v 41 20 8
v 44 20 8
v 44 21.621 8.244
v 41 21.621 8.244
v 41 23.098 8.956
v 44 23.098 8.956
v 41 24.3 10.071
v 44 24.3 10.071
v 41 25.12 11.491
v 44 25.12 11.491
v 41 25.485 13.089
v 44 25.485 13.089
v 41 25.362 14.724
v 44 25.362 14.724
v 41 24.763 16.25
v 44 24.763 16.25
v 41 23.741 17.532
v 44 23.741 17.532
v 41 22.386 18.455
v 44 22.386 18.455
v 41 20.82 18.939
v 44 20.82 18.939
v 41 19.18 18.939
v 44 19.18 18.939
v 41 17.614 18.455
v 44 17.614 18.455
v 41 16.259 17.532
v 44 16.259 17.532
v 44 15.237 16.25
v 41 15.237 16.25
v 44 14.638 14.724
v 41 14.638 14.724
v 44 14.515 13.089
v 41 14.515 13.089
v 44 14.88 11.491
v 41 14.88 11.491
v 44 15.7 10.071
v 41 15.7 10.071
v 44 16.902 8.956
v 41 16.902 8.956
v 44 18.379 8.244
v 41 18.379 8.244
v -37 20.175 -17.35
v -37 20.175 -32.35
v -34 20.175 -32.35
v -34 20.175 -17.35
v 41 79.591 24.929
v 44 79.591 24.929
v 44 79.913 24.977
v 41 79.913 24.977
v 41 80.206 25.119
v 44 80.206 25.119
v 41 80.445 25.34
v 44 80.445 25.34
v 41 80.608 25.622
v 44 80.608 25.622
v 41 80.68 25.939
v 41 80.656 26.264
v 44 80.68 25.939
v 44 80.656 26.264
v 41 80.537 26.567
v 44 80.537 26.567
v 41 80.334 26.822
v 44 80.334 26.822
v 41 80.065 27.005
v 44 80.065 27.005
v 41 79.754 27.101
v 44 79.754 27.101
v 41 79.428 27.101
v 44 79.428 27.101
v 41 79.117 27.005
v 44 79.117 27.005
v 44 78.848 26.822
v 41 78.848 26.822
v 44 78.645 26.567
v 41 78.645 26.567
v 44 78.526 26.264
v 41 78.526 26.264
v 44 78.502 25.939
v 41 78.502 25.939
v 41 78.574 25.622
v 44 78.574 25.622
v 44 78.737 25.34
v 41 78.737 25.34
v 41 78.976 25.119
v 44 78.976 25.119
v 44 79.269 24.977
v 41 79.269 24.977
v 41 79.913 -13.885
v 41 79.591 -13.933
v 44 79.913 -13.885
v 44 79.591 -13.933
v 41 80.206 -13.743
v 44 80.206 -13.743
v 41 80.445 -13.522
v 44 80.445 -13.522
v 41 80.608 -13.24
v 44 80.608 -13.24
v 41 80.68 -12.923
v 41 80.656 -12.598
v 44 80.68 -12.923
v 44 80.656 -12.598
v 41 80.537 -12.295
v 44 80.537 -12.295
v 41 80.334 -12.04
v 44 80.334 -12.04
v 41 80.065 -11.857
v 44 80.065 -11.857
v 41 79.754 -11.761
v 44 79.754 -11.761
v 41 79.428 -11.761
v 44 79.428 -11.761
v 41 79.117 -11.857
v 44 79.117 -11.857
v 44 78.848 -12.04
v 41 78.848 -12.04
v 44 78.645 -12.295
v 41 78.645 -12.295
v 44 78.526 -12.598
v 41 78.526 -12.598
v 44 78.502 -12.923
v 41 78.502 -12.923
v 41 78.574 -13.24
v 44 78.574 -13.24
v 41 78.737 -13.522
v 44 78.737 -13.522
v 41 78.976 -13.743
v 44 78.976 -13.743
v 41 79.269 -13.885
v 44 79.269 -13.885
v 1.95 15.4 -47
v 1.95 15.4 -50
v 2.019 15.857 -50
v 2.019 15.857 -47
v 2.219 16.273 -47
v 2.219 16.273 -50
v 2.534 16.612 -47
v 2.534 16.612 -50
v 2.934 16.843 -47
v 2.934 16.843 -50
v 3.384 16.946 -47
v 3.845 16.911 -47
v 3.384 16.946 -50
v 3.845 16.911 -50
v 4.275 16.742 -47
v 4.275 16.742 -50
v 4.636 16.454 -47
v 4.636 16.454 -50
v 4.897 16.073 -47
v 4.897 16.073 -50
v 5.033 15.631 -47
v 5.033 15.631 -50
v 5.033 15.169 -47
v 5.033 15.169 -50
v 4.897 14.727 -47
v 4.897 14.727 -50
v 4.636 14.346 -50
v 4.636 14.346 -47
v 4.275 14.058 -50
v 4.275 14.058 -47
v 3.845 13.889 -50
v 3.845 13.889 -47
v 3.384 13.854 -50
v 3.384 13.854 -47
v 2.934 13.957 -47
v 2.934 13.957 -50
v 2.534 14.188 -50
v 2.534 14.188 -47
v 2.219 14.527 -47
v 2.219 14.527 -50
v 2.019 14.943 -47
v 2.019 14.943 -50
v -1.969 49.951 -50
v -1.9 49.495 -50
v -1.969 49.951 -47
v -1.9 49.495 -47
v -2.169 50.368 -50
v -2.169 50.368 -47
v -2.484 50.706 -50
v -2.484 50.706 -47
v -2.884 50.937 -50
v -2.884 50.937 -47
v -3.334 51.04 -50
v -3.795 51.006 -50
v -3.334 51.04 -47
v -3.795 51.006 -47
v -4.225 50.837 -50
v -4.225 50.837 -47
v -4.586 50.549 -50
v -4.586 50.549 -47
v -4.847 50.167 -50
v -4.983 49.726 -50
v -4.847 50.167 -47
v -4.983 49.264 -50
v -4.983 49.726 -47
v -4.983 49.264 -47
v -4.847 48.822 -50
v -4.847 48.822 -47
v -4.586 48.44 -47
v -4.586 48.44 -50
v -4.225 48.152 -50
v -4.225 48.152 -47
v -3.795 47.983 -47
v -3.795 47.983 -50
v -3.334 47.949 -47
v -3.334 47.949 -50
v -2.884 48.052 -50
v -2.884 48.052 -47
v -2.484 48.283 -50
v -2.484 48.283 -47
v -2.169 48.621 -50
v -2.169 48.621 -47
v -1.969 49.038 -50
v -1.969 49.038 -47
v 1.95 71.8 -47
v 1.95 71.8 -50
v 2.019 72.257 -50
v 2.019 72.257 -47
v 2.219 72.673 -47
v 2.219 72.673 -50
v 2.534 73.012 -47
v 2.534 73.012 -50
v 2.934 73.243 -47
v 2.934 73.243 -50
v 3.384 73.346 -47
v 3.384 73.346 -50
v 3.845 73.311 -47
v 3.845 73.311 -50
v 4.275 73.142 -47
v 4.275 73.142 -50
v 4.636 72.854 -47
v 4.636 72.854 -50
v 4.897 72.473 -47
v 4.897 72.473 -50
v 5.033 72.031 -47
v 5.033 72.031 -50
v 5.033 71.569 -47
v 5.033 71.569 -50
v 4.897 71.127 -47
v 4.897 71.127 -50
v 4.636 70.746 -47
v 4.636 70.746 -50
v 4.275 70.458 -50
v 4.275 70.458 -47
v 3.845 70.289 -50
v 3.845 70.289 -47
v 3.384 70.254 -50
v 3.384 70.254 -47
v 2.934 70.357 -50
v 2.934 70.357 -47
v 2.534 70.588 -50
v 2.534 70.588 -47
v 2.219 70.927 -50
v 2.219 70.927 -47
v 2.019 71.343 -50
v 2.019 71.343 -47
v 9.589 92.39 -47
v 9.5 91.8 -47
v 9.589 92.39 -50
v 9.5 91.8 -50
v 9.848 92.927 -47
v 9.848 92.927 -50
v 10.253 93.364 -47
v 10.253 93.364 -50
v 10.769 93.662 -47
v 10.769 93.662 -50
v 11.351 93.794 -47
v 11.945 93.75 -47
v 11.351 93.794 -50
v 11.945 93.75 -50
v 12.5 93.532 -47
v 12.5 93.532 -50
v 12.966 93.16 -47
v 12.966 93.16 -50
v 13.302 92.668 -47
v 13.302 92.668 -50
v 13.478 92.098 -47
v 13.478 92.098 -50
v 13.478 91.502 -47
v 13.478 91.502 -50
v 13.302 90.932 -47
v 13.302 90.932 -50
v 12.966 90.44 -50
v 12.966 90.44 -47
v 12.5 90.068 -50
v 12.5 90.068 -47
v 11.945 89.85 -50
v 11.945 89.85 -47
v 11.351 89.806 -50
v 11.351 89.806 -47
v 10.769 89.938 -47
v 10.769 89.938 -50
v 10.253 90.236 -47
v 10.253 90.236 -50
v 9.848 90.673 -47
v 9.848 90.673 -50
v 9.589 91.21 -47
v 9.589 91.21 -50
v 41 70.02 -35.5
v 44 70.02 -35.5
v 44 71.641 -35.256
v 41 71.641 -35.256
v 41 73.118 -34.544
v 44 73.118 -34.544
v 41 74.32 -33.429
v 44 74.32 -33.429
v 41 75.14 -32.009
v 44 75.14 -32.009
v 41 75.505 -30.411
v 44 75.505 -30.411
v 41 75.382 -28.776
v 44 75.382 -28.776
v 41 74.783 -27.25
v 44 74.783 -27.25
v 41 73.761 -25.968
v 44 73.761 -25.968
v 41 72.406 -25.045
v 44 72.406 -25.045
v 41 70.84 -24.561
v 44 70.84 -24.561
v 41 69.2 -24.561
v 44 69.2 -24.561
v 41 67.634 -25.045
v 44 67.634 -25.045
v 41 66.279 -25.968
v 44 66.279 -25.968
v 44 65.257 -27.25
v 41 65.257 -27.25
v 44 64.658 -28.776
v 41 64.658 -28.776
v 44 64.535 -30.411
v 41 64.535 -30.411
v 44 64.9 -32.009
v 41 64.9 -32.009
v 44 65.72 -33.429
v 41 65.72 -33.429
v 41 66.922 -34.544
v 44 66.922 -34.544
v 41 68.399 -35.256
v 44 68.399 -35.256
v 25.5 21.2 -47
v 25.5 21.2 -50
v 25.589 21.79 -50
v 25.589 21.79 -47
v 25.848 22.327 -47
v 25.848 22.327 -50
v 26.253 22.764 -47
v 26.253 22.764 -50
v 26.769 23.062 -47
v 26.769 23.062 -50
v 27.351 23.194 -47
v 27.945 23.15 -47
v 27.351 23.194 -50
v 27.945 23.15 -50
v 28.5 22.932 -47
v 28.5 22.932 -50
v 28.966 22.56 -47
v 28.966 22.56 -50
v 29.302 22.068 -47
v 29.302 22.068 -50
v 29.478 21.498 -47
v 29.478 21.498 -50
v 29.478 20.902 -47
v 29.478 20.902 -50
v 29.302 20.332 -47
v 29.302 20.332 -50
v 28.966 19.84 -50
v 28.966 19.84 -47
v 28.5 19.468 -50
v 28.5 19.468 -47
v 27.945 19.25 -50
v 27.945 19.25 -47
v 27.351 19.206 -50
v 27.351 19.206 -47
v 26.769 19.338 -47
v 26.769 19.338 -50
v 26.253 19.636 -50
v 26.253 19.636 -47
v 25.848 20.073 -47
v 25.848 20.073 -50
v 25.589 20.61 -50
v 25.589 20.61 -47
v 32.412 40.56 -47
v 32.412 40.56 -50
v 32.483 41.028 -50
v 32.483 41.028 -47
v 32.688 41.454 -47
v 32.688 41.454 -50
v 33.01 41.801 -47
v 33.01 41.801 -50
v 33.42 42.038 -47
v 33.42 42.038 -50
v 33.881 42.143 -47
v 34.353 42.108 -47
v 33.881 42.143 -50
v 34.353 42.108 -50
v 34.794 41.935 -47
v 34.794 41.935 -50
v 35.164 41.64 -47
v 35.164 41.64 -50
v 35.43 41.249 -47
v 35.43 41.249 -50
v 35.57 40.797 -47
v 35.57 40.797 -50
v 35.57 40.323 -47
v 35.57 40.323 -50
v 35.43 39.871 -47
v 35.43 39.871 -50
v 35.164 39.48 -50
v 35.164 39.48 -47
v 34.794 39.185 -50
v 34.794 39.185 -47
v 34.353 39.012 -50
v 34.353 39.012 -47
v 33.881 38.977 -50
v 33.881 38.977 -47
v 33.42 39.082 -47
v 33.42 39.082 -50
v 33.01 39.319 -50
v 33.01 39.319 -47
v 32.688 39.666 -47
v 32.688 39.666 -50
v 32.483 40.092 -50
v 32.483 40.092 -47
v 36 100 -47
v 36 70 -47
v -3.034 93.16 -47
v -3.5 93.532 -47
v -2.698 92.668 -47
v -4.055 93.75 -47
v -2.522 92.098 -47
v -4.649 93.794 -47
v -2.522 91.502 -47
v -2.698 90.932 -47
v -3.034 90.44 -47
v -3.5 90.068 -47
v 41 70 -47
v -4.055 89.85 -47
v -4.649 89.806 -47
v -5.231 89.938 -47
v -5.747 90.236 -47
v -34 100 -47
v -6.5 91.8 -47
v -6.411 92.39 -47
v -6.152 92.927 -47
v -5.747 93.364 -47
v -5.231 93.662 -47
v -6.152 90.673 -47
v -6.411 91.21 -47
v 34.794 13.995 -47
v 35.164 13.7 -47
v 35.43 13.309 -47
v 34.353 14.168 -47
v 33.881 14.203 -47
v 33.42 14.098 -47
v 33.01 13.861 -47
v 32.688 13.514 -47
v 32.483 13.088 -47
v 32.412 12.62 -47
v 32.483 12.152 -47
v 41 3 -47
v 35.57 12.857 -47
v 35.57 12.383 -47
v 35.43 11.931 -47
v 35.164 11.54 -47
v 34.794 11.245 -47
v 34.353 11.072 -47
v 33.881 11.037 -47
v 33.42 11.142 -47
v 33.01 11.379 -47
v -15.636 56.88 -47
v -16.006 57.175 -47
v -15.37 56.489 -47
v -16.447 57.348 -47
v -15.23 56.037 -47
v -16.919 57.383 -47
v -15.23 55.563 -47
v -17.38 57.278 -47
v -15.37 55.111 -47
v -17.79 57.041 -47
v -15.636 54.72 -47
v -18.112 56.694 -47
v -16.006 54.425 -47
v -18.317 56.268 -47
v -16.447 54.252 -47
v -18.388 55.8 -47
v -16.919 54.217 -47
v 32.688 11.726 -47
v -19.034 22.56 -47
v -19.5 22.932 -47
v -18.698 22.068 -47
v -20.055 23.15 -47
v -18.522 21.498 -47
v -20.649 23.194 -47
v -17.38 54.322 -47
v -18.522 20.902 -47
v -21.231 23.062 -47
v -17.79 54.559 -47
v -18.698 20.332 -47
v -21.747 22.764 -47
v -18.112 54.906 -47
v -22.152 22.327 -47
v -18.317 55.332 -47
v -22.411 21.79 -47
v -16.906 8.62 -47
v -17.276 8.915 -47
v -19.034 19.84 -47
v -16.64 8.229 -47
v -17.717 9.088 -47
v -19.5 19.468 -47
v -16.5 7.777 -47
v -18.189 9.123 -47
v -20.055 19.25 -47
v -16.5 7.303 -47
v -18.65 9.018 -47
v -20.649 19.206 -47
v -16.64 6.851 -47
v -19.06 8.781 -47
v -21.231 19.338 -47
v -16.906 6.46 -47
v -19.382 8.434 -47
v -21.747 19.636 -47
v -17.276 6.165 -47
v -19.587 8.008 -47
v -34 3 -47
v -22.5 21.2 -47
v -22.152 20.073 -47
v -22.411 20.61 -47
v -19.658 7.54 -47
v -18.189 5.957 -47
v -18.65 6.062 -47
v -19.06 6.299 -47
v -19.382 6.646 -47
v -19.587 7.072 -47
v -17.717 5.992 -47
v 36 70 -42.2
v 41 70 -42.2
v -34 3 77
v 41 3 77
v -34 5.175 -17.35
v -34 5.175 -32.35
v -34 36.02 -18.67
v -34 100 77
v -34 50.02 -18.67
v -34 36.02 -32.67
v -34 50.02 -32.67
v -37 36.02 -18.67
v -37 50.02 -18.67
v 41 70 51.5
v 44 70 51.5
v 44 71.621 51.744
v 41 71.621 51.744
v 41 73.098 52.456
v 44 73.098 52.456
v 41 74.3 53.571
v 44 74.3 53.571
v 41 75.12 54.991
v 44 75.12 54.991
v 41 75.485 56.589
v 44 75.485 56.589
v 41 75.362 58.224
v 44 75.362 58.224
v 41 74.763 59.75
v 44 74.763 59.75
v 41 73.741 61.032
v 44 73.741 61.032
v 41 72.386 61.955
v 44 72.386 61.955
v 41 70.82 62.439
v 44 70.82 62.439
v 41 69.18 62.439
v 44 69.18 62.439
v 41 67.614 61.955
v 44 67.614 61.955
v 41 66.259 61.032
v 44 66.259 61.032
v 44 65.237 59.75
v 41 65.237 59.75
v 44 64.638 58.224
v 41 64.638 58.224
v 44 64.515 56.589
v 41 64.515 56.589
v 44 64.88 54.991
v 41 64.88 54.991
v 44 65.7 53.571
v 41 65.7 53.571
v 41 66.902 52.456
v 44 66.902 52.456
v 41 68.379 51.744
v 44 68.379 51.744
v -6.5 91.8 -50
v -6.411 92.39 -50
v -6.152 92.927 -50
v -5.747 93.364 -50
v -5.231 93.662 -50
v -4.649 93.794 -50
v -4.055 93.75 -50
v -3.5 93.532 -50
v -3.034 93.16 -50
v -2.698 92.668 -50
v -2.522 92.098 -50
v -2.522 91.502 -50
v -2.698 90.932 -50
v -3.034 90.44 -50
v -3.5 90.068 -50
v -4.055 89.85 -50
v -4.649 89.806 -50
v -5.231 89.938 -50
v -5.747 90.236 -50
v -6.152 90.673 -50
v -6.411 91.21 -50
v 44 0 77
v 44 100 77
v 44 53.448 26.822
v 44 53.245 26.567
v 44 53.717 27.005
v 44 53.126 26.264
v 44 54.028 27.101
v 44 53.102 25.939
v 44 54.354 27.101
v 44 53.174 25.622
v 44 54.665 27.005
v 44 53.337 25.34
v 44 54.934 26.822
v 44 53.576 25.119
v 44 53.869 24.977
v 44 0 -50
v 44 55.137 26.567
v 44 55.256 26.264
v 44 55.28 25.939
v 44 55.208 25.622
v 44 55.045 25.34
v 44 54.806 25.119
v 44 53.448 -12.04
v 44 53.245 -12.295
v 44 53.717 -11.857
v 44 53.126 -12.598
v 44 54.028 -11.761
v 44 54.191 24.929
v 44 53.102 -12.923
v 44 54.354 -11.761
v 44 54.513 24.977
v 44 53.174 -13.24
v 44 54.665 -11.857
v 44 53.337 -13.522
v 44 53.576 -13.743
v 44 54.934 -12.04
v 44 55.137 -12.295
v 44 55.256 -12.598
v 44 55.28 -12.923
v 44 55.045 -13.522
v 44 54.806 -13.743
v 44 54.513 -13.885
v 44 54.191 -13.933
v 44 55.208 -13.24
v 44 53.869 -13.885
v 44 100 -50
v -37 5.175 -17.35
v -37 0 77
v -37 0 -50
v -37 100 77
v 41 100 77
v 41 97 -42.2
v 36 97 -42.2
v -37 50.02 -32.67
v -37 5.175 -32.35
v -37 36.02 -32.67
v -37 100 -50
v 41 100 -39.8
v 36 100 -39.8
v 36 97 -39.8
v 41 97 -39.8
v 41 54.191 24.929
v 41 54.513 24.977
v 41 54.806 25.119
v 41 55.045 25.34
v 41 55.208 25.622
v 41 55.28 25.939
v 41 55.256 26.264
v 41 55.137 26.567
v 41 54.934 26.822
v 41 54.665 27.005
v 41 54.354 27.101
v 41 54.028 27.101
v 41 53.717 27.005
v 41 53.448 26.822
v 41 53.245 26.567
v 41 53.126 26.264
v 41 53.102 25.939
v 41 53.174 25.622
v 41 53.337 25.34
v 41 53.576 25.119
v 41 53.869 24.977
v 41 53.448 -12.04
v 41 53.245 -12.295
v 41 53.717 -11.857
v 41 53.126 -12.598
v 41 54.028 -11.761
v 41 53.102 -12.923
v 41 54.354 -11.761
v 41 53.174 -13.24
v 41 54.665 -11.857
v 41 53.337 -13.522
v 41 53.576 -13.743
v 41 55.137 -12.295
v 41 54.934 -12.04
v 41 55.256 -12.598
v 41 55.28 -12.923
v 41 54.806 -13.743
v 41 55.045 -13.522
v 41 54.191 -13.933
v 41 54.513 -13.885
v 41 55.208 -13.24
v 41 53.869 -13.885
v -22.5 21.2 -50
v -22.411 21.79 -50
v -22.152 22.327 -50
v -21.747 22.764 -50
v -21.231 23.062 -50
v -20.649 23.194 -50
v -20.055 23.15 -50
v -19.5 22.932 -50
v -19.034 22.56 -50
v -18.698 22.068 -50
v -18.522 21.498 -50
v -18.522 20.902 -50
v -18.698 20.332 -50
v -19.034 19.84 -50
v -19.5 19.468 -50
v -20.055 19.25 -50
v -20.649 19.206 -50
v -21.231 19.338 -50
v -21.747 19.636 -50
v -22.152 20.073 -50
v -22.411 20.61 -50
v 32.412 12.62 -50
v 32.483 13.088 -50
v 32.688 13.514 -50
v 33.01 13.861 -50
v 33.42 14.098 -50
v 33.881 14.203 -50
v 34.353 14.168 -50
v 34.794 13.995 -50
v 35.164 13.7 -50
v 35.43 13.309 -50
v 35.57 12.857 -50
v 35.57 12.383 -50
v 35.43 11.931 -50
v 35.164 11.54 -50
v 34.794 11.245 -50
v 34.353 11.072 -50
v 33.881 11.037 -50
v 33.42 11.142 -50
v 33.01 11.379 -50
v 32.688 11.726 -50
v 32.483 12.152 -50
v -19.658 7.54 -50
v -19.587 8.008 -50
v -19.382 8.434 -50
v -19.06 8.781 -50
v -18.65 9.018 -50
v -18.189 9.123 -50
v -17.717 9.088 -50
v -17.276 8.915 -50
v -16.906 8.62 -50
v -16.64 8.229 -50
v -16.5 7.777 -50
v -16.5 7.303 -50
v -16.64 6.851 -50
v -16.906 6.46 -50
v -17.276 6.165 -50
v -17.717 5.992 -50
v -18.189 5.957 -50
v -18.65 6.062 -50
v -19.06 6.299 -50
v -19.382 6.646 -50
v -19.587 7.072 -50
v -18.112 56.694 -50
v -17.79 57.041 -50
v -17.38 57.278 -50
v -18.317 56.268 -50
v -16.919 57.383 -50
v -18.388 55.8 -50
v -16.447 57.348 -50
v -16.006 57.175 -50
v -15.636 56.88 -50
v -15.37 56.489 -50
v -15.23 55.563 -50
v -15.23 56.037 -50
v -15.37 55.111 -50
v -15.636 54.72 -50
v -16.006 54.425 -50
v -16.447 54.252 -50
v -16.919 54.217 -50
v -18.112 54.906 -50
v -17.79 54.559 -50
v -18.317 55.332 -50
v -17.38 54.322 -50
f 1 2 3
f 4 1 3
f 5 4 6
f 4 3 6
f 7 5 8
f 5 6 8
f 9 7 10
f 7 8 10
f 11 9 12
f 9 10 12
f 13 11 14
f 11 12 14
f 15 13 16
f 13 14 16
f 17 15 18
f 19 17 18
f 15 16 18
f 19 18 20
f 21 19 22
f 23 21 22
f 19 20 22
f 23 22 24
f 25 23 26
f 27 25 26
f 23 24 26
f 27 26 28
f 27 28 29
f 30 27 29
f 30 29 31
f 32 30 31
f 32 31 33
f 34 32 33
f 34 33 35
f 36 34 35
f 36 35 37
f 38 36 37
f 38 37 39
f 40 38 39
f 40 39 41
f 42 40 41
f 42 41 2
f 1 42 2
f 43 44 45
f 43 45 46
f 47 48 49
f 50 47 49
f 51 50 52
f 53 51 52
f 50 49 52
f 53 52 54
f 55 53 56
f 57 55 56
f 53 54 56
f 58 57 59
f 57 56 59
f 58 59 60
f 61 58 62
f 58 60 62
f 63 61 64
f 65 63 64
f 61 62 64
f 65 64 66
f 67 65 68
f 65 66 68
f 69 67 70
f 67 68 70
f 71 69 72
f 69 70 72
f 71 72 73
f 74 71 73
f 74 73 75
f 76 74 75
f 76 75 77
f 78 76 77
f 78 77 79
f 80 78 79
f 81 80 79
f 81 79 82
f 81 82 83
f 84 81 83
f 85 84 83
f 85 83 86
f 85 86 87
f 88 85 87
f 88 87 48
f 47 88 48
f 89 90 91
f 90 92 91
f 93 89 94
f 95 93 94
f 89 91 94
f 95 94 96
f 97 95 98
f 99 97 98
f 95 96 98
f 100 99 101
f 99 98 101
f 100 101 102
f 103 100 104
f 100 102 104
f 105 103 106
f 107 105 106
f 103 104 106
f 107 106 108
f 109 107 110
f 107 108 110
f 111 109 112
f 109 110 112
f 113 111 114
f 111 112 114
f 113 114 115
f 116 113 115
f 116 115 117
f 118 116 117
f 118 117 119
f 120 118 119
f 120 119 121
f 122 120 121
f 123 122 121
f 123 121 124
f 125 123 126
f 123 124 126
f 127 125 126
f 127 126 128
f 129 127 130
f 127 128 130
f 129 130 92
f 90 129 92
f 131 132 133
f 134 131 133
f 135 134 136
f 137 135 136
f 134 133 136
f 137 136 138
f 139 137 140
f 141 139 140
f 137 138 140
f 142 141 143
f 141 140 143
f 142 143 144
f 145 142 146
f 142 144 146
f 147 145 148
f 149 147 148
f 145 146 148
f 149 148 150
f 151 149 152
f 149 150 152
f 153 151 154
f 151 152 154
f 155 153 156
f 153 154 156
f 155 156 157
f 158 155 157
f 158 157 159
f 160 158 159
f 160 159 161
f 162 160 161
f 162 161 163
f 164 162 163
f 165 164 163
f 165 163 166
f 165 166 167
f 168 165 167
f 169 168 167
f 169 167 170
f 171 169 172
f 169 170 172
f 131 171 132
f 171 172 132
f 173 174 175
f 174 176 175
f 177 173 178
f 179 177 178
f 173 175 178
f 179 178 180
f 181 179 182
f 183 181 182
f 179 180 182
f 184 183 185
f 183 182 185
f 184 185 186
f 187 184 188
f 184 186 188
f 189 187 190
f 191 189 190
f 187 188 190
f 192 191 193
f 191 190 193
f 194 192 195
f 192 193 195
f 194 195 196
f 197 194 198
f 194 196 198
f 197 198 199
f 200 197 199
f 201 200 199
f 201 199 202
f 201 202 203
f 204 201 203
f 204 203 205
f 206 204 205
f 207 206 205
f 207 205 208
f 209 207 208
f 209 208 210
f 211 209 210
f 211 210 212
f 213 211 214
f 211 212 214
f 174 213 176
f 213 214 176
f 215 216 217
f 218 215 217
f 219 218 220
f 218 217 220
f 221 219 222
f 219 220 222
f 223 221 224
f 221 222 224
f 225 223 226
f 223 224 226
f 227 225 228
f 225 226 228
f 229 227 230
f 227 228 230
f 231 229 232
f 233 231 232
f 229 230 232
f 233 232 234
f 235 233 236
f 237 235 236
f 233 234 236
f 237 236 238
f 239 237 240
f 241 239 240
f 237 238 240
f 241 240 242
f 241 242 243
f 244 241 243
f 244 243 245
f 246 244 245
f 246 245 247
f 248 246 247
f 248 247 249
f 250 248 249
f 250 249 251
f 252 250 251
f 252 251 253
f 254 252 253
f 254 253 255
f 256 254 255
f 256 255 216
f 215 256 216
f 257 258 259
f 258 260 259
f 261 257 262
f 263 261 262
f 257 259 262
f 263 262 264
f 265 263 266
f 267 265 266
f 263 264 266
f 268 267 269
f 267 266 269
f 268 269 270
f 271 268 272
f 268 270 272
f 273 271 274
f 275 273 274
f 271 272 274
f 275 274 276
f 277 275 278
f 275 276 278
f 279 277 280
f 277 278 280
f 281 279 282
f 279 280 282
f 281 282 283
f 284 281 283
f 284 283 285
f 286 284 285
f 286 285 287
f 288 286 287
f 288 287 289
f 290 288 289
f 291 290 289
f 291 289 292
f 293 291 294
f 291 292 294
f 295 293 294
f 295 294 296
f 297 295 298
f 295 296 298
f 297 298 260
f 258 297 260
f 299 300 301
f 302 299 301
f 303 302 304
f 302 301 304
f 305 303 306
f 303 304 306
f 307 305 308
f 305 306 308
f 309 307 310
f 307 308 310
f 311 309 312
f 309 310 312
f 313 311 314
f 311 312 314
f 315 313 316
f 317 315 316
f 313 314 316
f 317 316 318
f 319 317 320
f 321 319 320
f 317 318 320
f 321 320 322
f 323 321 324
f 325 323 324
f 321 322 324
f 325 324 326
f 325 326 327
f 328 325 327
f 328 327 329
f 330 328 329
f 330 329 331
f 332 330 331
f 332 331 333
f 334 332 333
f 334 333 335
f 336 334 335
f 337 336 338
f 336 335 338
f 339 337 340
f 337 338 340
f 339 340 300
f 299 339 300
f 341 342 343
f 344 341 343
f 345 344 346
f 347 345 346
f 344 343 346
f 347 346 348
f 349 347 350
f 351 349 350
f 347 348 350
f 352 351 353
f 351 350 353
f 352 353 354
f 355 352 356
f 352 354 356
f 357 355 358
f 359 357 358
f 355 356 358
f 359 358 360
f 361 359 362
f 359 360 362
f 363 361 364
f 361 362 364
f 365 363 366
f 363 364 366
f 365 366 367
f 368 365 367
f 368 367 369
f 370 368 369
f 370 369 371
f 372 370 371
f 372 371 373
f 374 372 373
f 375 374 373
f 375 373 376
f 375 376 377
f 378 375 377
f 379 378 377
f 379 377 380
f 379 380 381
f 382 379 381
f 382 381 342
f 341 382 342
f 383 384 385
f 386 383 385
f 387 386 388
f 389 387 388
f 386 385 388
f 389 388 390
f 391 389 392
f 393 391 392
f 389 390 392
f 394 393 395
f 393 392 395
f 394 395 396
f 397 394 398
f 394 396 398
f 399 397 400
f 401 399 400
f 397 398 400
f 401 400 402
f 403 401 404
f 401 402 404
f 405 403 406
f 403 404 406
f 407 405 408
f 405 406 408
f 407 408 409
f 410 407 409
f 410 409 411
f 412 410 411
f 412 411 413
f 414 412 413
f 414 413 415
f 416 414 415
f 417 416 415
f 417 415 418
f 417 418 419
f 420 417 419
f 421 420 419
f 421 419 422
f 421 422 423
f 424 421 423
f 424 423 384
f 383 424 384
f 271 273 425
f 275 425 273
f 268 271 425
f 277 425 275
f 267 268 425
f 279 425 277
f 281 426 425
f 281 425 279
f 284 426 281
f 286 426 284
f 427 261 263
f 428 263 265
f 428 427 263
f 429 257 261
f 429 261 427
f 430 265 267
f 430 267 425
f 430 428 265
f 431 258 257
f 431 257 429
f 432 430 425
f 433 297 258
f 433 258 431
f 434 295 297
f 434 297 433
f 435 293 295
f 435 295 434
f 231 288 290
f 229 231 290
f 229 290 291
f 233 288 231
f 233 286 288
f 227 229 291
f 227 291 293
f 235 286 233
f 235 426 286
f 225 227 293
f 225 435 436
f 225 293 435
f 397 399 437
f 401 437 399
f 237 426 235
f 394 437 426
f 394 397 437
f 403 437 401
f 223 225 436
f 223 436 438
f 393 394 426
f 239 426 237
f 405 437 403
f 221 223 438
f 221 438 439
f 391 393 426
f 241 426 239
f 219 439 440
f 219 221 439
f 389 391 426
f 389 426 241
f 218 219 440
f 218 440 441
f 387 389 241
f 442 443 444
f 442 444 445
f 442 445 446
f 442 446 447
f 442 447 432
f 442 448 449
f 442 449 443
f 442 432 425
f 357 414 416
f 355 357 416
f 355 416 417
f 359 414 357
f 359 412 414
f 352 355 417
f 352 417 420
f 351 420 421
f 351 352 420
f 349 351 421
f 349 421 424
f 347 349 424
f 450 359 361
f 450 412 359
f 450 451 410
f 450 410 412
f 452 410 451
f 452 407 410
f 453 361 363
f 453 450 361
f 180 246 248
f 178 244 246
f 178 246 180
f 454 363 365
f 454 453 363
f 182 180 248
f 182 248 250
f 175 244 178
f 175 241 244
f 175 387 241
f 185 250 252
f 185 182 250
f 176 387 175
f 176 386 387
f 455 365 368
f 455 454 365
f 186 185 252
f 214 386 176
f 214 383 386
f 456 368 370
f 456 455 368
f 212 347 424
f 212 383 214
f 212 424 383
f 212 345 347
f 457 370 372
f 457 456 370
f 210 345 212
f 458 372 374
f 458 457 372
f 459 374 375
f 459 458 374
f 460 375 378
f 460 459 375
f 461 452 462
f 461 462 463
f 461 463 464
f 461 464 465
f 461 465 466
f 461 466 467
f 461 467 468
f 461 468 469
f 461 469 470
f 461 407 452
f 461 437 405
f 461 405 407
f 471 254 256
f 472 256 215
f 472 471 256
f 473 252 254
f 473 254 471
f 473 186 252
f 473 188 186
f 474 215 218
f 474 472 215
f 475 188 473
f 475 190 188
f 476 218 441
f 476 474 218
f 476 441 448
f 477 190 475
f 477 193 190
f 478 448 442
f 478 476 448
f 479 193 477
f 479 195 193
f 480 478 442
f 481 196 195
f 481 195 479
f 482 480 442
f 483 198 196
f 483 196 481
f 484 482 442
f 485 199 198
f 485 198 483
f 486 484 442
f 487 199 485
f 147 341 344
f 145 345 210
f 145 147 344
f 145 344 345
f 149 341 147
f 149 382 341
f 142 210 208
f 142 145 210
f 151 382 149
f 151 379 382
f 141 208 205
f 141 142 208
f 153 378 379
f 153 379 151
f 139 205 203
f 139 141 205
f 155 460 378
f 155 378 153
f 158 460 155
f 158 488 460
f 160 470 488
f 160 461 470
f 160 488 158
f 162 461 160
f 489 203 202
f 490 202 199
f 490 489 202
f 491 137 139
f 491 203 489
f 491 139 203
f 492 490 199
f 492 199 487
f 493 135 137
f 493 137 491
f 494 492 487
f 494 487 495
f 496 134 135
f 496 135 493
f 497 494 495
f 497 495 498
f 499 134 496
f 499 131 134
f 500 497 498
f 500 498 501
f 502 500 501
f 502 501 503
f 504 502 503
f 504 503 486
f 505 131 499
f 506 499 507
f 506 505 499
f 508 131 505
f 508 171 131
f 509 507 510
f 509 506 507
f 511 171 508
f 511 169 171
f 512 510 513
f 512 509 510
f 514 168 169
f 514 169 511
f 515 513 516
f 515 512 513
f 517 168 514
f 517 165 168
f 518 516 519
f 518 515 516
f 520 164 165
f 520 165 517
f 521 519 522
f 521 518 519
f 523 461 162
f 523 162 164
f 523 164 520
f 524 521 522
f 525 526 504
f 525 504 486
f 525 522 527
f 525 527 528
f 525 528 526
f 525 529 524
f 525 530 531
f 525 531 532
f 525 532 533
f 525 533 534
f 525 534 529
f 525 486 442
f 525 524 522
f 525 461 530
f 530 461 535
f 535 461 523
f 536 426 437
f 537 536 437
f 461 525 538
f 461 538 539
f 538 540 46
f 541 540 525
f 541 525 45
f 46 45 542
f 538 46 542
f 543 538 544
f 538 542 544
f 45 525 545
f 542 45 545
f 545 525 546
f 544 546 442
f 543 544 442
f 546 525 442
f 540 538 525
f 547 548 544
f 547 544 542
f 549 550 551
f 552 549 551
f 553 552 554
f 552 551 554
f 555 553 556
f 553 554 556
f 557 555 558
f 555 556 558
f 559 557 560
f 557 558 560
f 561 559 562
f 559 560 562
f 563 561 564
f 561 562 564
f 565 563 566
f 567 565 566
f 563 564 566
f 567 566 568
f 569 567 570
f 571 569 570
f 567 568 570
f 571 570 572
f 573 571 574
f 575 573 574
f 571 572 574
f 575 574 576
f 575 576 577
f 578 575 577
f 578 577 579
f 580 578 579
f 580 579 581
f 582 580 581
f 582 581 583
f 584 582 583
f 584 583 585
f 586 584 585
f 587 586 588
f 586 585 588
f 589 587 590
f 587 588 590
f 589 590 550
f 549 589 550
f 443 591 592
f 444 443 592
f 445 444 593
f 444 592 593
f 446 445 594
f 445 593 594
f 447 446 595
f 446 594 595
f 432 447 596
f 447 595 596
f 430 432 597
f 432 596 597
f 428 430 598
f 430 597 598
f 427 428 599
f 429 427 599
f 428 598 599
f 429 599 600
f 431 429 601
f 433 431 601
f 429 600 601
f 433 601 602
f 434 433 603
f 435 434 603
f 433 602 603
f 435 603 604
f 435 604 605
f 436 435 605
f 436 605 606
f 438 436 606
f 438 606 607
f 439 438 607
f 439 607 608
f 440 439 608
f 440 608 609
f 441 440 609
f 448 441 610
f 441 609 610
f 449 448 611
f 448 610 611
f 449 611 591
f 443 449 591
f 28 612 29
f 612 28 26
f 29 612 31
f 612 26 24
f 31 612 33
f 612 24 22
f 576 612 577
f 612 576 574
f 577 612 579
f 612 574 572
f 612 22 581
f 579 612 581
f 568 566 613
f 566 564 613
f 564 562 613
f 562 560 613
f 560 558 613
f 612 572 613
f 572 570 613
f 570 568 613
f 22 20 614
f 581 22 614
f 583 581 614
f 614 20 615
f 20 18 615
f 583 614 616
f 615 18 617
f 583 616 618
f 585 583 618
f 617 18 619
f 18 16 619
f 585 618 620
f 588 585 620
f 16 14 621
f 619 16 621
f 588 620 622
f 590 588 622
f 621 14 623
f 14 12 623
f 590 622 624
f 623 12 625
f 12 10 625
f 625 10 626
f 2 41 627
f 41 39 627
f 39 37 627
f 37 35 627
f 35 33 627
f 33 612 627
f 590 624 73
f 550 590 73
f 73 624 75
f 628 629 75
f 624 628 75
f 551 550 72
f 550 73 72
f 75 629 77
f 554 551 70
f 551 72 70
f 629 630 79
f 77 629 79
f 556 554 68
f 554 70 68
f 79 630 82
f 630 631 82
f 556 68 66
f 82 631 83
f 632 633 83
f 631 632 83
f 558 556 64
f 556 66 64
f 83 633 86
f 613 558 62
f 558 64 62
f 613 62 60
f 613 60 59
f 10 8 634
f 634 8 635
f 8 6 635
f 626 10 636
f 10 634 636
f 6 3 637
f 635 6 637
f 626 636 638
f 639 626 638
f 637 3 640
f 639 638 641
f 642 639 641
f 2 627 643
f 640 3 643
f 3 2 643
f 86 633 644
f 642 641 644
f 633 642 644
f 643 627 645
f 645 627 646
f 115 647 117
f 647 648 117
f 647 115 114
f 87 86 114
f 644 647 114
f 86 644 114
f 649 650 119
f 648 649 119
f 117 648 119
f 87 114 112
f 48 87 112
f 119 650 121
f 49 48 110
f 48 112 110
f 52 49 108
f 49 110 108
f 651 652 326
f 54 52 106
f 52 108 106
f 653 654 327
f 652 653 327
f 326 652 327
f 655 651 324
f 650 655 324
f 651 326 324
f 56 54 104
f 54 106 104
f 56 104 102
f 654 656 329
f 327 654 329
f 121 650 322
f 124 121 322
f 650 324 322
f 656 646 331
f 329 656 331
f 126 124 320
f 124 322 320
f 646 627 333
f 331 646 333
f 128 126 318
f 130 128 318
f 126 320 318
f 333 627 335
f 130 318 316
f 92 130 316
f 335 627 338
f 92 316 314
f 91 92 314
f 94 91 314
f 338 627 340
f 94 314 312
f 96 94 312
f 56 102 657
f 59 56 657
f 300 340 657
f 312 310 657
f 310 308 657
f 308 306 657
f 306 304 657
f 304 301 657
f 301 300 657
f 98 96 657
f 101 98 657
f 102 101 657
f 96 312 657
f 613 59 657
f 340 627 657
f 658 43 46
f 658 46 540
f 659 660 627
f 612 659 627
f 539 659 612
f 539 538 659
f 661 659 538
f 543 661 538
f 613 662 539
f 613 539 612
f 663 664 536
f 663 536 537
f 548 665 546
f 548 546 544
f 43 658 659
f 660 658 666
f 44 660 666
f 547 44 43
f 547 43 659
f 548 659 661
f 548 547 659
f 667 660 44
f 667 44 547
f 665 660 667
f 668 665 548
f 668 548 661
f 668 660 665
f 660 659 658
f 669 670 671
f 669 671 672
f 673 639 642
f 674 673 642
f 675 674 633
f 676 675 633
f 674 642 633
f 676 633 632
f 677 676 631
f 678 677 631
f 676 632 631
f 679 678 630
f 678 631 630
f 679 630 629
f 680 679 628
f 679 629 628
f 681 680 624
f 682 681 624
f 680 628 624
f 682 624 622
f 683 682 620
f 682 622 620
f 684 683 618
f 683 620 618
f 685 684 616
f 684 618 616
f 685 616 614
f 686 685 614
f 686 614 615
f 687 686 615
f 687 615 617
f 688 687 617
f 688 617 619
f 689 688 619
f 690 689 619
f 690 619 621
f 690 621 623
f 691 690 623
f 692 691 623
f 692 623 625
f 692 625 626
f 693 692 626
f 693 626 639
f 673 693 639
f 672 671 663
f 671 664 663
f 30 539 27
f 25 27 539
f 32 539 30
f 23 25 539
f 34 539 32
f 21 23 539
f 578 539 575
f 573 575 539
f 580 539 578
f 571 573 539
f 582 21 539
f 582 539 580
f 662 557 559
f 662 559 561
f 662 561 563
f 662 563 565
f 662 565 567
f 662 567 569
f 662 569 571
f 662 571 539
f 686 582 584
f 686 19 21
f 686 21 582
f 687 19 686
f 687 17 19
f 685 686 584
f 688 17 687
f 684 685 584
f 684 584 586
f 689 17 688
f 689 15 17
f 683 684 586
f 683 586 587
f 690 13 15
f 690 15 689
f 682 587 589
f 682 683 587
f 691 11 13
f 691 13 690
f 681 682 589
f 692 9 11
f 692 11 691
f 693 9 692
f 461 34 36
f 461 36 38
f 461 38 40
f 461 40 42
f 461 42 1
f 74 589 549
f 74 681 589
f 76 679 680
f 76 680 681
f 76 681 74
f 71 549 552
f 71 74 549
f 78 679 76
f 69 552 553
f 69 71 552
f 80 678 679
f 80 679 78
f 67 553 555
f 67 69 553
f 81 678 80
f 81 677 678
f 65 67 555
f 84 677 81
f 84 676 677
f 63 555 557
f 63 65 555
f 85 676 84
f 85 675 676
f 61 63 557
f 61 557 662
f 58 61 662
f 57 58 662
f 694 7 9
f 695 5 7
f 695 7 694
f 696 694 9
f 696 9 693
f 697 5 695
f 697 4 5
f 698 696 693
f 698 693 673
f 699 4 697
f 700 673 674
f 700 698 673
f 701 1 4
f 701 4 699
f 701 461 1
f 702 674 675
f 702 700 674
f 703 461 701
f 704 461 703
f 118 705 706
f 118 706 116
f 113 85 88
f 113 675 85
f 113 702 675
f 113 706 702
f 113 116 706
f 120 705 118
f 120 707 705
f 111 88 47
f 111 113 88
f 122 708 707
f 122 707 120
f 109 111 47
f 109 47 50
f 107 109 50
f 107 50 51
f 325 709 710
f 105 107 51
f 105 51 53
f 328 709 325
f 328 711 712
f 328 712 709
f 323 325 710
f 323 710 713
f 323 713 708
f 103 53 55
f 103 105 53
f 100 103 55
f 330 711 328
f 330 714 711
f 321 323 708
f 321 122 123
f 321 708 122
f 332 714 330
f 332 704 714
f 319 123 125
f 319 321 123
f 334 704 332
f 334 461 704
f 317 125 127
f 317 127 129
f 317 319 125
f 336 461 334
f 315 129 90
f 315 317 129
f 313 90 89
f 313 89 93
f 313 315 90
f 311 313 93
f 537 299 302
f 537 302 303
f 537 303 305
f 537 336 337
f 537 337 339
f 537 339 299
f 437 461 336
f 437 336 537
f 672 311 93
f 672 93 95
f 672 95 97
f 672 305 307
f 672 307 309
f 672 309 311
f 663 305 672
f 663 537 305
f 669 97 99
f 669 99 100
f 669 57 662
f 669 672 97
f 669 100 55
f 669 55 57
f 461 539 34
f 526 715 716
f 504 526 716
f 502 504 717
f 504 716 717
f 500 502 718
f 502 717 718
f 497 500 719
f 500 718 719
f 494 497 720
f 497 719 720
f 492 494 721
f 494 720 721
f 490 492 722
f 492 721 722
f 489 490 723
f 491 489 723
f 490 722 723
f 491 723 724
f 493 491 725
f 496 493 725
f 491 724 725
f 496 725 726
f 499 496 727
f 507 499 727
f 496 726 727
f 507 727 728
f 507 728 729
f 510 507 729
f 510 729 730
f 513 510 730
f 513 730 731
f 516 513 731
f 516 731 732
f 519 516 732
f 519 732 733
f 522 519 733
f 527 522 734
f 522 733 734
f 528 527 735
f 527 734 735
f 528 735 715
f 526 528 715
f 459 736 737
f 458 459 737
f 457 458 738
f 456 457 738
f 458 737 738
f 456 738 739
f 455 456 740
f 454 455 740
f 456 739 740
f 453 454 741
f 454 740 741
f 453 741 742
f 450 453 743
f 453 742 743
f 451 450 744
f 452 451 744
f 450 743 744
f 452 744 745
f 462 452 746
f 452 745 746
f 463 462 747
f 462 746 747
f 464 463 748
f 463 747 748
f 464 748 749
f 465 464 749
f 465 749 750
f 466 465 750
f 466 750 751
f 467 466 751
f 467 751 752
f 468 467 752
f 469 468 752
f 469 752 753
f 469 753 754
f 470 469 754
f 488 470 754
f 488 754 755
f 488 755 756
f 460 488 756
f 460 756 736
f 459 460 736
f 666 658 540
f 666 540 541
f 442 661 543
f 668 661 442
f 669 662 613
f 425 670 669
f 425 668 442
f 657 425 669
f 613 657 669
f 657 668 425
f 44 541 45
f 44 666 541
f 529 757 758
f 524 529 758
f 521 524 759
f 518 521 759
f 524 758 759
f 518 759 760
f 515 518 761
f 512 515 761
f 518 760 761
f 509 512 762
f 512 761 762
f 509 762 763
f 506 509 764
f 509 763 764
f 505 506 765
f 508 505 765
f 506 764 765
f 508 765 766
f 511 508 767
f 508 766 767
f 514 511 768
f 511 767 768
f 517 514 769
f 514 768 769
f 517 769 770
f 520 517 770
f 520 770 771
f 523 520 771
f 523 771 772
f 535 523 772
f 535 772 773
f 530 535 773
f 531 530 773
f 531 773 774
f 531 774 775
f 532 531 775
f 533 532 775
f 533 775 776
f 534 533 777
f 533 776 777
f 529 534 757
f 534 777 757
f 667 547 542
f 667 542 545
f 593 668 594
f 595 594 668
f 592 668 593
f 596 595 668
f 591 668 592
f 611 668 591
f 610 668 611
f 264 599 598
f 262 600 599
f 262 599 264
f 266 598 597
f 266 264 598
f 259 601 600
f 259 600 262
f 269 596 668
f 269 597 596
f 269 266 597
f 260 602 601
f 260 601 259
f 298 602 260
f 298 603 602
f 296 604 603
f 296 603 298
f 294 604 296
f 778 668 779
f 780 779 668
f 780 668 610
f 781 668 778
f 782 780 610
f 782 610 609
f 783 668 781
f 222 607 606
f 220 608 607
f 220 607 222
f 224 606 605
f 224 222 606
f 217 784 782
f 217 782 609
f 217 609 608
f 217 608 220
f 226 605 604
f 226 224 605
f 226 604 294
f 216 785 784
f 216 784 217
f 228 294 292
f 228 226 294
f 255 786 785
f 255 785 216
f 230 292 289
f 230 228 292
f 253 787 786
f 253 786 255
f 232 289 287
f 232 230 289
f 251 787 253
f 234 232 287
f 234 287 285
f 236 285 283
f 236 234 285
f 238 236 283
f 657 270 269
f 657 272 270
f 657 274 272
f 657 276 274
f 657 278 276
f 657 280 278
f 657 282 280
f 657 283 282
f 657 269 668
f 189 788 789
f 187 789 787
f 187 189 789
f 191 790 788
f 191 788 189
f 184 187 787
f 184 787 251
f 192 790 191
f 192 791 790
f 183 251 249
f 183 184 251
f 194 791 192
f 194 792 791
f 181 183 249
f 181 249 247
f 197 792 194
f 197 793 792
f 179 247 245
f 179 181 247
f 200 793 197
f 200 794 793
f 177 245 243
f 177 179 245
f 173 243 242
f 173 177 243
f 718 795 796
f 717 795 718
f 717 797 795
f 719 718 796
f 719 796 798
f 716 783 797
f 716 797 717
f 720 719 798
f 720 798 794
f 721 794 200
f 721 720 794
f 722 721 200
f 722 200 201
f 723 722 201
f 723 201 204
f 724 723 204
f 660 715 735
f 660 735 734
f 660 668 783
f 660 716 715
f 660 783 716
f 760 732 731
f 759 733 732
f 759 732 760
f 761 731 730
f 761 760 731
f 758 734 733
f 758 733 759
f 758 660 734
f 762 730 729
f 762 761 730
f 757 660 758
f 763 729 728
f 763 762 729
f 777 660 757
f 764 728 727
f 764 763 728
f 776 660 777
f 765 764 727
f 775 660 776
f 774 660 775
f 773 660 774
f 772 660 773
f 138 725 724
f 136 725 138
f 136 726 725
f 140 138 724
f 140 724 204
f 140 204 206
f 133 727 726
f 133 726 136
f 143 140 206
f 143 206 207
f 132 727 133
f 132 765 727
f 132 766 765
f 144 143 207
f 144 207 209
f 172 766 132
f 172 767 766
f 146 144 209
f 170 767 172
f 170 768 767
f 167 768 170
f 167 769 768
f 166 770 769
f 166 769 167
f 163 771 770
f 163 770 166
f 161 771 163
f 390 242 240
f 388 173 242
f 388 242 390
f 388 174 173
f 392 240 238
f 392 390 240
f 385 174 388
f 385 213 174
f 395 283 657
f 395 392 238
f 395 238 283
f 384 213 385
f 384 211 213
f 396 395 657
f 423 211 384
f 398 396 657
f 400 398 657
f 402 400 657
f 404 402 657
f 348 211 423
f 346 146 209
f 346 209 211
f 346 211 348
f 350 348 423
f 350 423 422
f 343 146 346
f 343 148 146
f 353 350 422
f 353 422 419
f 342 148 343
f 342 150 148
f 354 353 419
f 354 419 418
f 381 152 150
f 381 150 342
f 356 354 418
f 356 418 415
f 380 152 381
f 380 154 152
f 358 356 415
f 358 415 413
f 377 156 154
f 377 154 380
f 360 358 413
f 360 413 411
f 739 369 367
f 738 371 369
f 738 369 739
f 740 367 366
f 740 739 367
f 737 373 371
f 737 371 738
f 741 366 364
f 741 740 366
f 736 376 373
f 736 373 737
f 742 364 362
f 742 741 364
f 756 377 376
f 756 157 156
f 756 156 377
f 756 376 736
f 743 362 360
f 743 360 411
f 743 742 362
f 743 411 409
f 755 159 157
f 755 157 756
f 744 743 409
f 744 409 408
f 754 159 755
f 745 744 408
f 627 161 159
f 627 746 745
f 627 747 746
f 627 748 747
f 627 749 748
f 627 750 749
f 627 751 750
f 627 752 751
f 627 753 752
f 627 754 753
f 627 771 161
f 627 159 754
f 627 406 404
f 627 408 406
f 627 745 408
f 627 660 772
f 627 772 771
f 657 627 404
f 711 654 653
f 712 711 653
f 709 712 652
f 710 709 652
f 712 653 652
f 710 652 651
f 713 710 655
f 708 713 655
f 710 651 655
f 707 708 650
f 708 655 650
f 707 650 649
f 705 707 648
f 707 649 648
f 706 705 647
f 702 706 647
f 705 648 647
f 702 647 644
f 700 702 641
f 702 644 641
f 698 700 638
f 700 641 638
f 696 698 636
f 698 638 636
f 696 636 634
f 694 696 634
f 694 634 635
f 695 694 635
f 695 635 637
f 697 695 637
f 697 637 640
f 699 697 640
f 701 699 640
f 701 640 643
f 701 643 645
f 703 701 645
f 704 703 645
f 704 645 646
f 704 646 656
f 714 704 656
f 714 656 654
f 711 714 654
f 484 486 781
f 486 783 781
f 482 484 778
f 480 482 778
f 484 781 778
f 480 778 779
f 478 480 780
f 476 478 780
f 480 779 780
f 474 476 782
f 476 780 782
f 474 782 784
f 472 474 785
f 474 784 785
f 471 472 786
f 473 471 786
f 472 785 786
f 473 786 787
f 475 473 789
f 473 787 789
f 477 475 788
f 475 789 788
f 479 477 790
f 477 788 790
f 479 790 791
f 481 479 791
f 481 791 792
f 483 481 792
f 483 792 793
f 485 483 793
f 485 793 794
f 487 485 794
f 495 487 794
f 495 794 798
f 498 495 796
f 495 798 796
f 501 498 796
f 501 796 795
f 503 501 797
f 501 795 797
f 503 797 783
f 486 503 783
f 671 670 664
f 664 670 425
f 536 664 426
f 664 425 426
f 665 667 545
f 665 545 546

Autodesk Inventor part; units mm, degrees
ref_plane "YZ Plane" through (0, 0, 0) normal (1, 0, 0) x (0, 1, 0)
ref_plane "XZ Plane" through (0, 0, 0) normal (0, 1, 0) x (-1, 0, 0)
ref_plane "XY Plane" through (0, 0, 0) normal (0, 0, 1) x (1, 0, 0)
sketch "Sketch3" plane through (0, 0, 0) normal (0, 1, 0) x (-1, 0, 0)
  line L0 (-44, 50) -> (44, 50)
  line L1 (44, 50) -> (44, -50)
  line L2 (44, -50) -> (-44, -50)
  line L3 (-44, -50) -> (-44, 50)
  line L4 (-44, 50) -> (44, -50) construction
  line L5 (44, 50) -> (-44, -50) construction
  line L6 (44, 50) -> (-44, 50)
  line L7 (-44, 50) -> (-44, 47)
  line L8 (-44, 47) -> (44, 47)
  line L9 (44, 47) -> (44, 50)
  line L10 (44, 47) -> (41, 47)
  line L11 (41, 47) -> (41, -50)
  line L12 (41, -50) -> (44, -50)
  line L13 (44, -50) -> (44, 47)
  line L14 (-44, 47) -> (-41, 47)
  line L15 (-41, 47) -> (-41, -50)
  line L16 (-41, -50) -> (-44, -50)
  line L17 (-44, -50) -> (-44, 47)
  line L18 (41, -50) -> (-41, -50)
  line L19 (-41, -50) -> (-41, -47)
  line L20 (-41, -47) -> (41, -47)
  line L21 (41, -47) -> (41, -50)
  line L22 (41, 47) -> (34, 47)
  line L23 (34, 47) -> (34, -50)
  line L24 (34, -50) -> (37, -50)
  line L25 (37, -50) -> (37, 50)
  line L26 (34, 47) -> (34, 50)
  line L27 (41, 47) -> (41, 50)
  line L28 (-41, 47) -> (-41, 50)
  point P0 (0, 0)
  point P1 (37, -47)
  point P2 (37, 47)
  point P3 (34, -47)
  point P4 (37, 50)
  dimension "d33" = 88
  dimension "d34" = 100
  dimension "d35" = 88
  dimension "d36" = 3
  dimension "d37" = 3
  dimension "d38" = 3
  dimension "d39" = 3
  dimension "d63" = 7
  dimension "d64" = 3
extrude "Extrusion2" add sketch "Sketch3" along normal blind 100 contours L8 L15 L2 L3 | L8 L25 L20 L23 | L20 L23 L2 L15 | L20 L25 L2 L23
sketch "Sketch6" plane through (44, 0, -50) normal (0, 0, -1) x (-1, 0, 0)
  circle A0 centre (62.07, 7.54) radius 1.5875
  circle A1 centre (10, 12.62) radius 1.5875
  circle A2 centre (10, 40.56) radius 1.5875
  line L0 (7.46, 10.08) -> (7.46, 42.846)
  line L1 (7.46, 42.846) -> (10, 45.386)
  line L2 (10, 45.386) -> (10, 58.34)
  line L3 (10, 7.54) -> (7.46, 10.08)
  line L4 (10, 5) -> (10, 7.54)
  line L5 (76.04, 5) -> (10, 5)
  line L6 (76.04, 58.34) -> (76.04, 5)
  line L7 (10, 58.34) -> (76.04, 58.34)
  circle A3 centre (60.8, 55.8) radius 1.5875
  line L8 (0, 0) -> (81, 0) projected
  line L9 (0, 100) -> (81, 100) projected
  line L10 (0, 0) -> (0, 100) projected
  line L11 (0, 0) -> (0, 100) projected
  line L12 (0, 0) -> (10, 0)
  line L13 (78, 0) -> (3, 0) projected
  line L14 (10, 0) -> (10, 5)
  line L15 (81, 0) -> (81, 100) projected
  point P0 (44, 0)
  point P1 (85, 0)
  dimension "d52" = 10
  dimension "d53" = 5
  dimension "d54" = 90
extrude "Extrusion4" cut sketch "Sketch6" against normal up to surface (3 mm away) contours A0 | A1 | A2 | A3
sketch "Sketch9" plane through (-37, 0, -50) normal (-1, 0, 0) x (0, 0, 1)
  line L0 (17.33, 50.02) -> (31.33, 50.02) projected
  line L1 (31.33, 50.02) -> (31.33, 36.02) projected
  line L2 (31.33, 36.02) -> (17.33, 36.02) projected
  line L3 (17.33, 36.02) -> (17.33, 50.02) projected
  line L4 (17.65, 20.175) -> (32.65, 20.175) projected
  line L5 (32.65, 20.175) -> (32.65, 5.175) projected
  line L6 (32.65, 5.175) -> (17.65, 5.175) projected
  line L7 (17.65, 5.175) -> (17.65, 20.175) projected
  point P0 (50, 0)
extrude "Extrusion6" cut sketch "Sketch9" against normal up to surface (3 mm away)
sketch "Sketch10" plane through (44, 0, 50) normal (1, 0, 0) x (0, 0, -1)
  circle A0 centre (23.979, 79.591) radius 1.0922
  circle A1 centre (62.841, 79.591) radius 1.0922
  circle A2 centre (62.841, 54.191) radius 1.0922
  line L0 (21.82, 50) -> (21.82, 81.75)
  line L1 (65, 50) -> (21.82, 50)
  line L2 (65, 81.75) -> (65, 50)
  line L3 (21.82, 81.75) -> (65, 81.75)
  circle A3 centre (23.979, 54.191) radius 1.0922
  line L4 (3, 0) -> (100, 0) projected
  line L5 (100, 0) -> (100, 100) projected
  line L6 (3, 100) -> (100, 100) projected
  line L7 (100, 0) -> (100, 100) projected
  line L8 (100, 100) -> (65, 100)
  line L9 (3, 100) -> (100, 100) projected
  line L10 (100, 100) -> (135, 100) construction
  line L11 (100, 0) -> (100, 100) projected
  line L12 (65, 100) -> (65, 0)
  line L13 (100, 0) -> (3, 0) projected
  line L14 (3, 0) -> (3, 100) projected
  point P0 (50, 0)
  point P1 (0, 0)
  point P2 (0, 100)
  dimension "d67" = 35
  dimension "d68" = 180
  dimension "d75" = 100
extrude "Extrusion7" cut sketch "Sketch10" against normal up to surface (3 mm away) contours A0 | A1 | A2 | A3
sketch "Sketch11" plane through (-37, 0, -50) normal (-1, 0, 0) x (0, 0, 1)
  circle A0 centre (75.1, 71.8) radius 1.55
  circle A1 centre (75.1, 15.4) radius 1.55
  line L0 (67.45, 5) -> (82.75, 5)
  line L1 (67.45, 82.2) -> (82.75, 82.2)
  line L2 (95, 82.2) -> (95, 5)
  line L3 (55.2, 82.2) -> (55.2, 5)
  line L4 (32.65, 5.175) -> (17.65, 5.175) projected
  line L5 (17.65, 5.175) -> (17.65, 20.175) projected
  line L6 (17.65, 20.175) -> (32.65, 20.175) projected
  line L7 (32.65, 20.175) -> (32.65, 5.175) projected
  line L8 (31.33, 50.02) -> (31.33, 36.02) projected
  line L9 (31.33, 36.02) -> (17.33, 36.02) projected
  line L10 (17.33, 36.02) -> (17.33, 50.02) projected
  line L11 (17.33, 50.02) -> (31.33, 50.02) projected
  line L12 (0, 0) -> (97, 0) projected
  line L13 (0, 100) -> (97, 100) projected
  line L14 (0, 0) -> (0, 100) projected
  line L15 (100, 0) -> (100, 100) projected
  line L16 (100, 0) -> (100, 5)
  line L17 (100, 5) -> (95, 5)
  line L18 (97, 0) -> (97, 100) projected
  point P0 (50, 0)
  dimension "d71" = 5
  dimension "d72" = 5
extrude "Extrusion8" [suppressed]
sketch "Sketch12" plane through (-34, 0, -47) normal (0, 0, 1) x (1, 0, 0)
  circle A0 centre (17.2, 55.8) radius 1.5875 projected
  circle A1 centre (68, 40.56) radius 1.5875 projected
  circle A2 centre (15.93, 7.54) radius 1.5875 projected
  circle A3 centre (68, 12.62) radius 1.5875 projected
  line L0 (0, 0) -> (75, 0) projected
  line L1 (75, 0) -> (75, 100) projected
  line L2 (0, 100) -> (75, 100) projected
  line L3 (0, 0) -> (0, 100) projected
  line L4 (75, 0) -> (75, 100) projected
  line L5 (75, 100) -> (70, 100)
  line L6 (70, 100) -> (70, 70)
  line L7 (70, 70) -> (75, 70)
  line L8 (75, 70) -> (75, 100)
  point P0 (34, 0)
  dimension "d76" = 5
  dimension "d77" = 30
extrude "Extrusion9" add sketch "Sketch12" along normal blind 4.8 contours L7 L6 L2 L1
sketch "Sketch13" plane through (-34, 0, -42.2) normal (0, 0, 1) x (1, 0, 0)
  line L0 (70, 100) -> (70, 70) projected
  line L1 (70, 70) -> (75, 70) projected
  line L2 (75, 100) -> (75, 70) projected
  line L3 (75, 100) -> (70, 100) projected
  line L4 (70, 100) -> (70, 70) projected
  line L5 (75, 100) -> (70, 100)
  line L6 (70, 100) -> (70, 97)
  line L7 (70, 97) -> (75, 97)
  line L8 (75, 97) -> (75, 100)
  point P0 (34, 0)
  dimension "d80" = 3
extrude "Extrusion10" add sketch "Sketch13" along normal blind 2.4 contours L3 L2 L7 L0
sketch "Sketch14" plane through (-34, 0, -47) normal (0, 0, 1) x (1, 0, 0)
  line L0 (75, 0) -> (75, 70) projected
  line L1 (0, 0) -> (0, 100) projected
  line L2 (75, 0) -> (0, 0)
  line L3 (0, 0) -> (0, 3)
  line L4 (0, 3) -> (75, 3)
  line L5 (75, 3) -> (75, 0)
  point P0 (34, 0)
  dimension "d83" = 3
extrude "Extrusion11" add sketch "Sketch14" along normal up to surface (94 mm away)
sketch "Sketch15" plane through (-37, 0, 47) normal (0, 0, 1) x (1, 0, 0)
  line L0 (0, 0) -> (81, 0) projected
  line L1 (81, 0) -> (81, 100) projected
  line L2 (78, 100) -> (81, 100) projected
  line L3 (78, 3) -> (78, 100) projected
  line L4 (3, 3) -> (78, 3) projected
  line L5 (3, 3) -> (3, 100) projected
  line L6 (0, 100) -> (3, 100) projected
  line L7 (0, 0) -> (0, 100) projected
  point P0 (37, 0)
extrude "Extrusion12" add sketch "Sketch15" along normal blind 30
sketch "Sketch16" plane through (-37, 0, -50) normal (-1, 0, 0) x (0, 0, 1)
  line L0 (17.65, 5.175) -> (17.65, 20.175) projected
  line L1 (17.65, 20.175) -> (32.65, 20.175) projected
  line L2 (32.65, 20.175) -> (32.65, 5.175) projected
  line L3 (32.65, 5.175) -> (17.65, 5.175) projected
  line L4 (17.33, 50.02) -> (31.33, 50.02) projected
  line L5 (31.33, 50.02) -> (31.33, 36.02) projected
  line L6 (31.33, 36.02) -> (17.33, 36.02) projected
  line L7 (17.33, 36.02) -> (17.33, 50.02) projected
  line L8 (0, 0) -> (127, 0) projected
  line L9 (127, 100) -> (127, 0) projected
  line L10 (0, 100) -> (127, 100) projected
  line L11 (0, 0) -> (0, 100) projected
  circle A0 centre (75.1, 71.8) radius 1.55 projected
  line L12 (75.1, 71.8) -> (75.1, 91.8)
  line L13 (75.1, 91.8) -> (83.1, 91.8)
  line L14 (75.1, 91.8) -> (67.1, 91.8)
  circle A1 centre (83.1, 91.8) radius 2
  circle A2 centre (67.1, 91.8) radius 2
  line L15 (127, 3) -> (127, 100) projected
  line L16 (127, 51.5) -> (71.1, 51.5)
  line L17 (75.1, 11.2) -> (83.1, 11.2)
  line L18 (75.1, 11.2) -> (67.1, 11.2)
  circle A3 centre (83.1, 11.2) radius 2
  circle A4 centre (67.1, 11.2) radius 2
  line L19 (83.1, 11.2) -> (91.1, 11.2)
  line L20 (67.1, 11.2) -> (59.1, 11.2)
  line L21 (127, 3) -> (3, 3) projected
  circle A5 centre (59.1, 11.2) radius 2
  circle A6 centre (91.1, 11.2) radius 2
  line L22 (91.1, 11.2) -> (99.1, 11.2)
  line L23 (99.1, 11.2) -> (99.1, 21.2)
  line L24 (99.1, 21.2) -> (51.1, 21.2)
  circle A7 centre (99.1, 21.2) radius 2
  circle A8 centre (51.1, 21.2) radius 2
  point P0 (50, 0)
  dimension "d88" = 20
  dimension "d89" = 8
  dimension "d90" = 8
  dimension "d91" = 4
  dimension "d92" = 4
  dimension "d95" = 8
  dimension "d96" = 8
  dimension "d97" = 4
  dimension "d98" = 4
  dimension "d99" = 8
  dimension "d100" = 10
  dimension "d101" = 48
  dimension "d102" = 4
  dimension "d103" = 4
extrude "Extrusion13" [suppressed]
sketch "Sketch17" plane through (44, 0, -50) normal (1, 0, 0) x (0, 0, -1)
  circle A0 centre (-37.159, 79.591) radius 1.0922 projected
  circle A1 centre (-76.021, 54.191) radius 1.0922 projected
  circle A2 centre (-37.159, 54.191) radius 1.0922 projected
  circle A3 centre (-76.021, 79.591) radius 1.0922 projected
  line L0 (0, 0) -> (-127, 0) projected
  line L1 (0, 0) -> (0, 100) projected
  line L2 (0, 100) -> (-127, 100) projected
  line L3 (-127, 0) -> (-127, 100) projected
  line L4 (-127, 0) -> (-127, 100) projected
  line L5 (-127, 50) -> (-107, 50)
  circle A4 centre (-107, 50) radius 5.5
  line L6 (0, 0) -> (-127, 0) projected
  line L7 (-63.5, 0) -> (-63.5, 20)
  circle A5 centre (-63.5, 20) radius 5.5
  line L8 (0, 0) -> (0, 100) projected
  line L9 (0, 50) -> (-20, 50.02)
  line L10 (-17.33, 50.02) -> (-31.33, 50.02) projected
  circle A6 centre (-20, 50.02) radius 5.5
  line L11 (-107, 50) -> (-107, 70)
  line L12 (-20, 50.02) -> (-20, 70.02)
  circle A7 centre (-107, 70) radius 5.5
  circle A8 centre (-20, 70.02) radius 5.5
  point P0 (-50, 0)
  dimension "d104" = 20
  dimension "d105" = 11
  dimension "d106" = 20
  dimension "d107" = 11
  dimension "d110" = 20
  dimension "d111" = 11
  dimension "d112" = 20
  dimension "d113" = 20
  dimension "d114" = 11
  dimension "d115" = 11
extrude "Extrusion14" cut sketch "Sketch17" against normal up to surface (3 mm away) contours A8 | A7 | A5
sketch "Sketch18" plane through (44, 0, -50) normal (0, 0, -1) x (-1, 0, 0)
  circle A0 centre (40.5, 15.4) radius 1.55
  circle A1 centre (40.5, 71.8) radius 1.55
  circle A2 centre (40.5, 71.8) radius 1.55
  line L0 (40.5, 71.8) -> (40.5, 91.8)
  line L1 (40.5, 91.8) -> (48.5, 91.8)
  line L2 (40.5, 91.8) -> (32.5, 91.8)
  circle A3 centre (48.5, 91.8) radius 2
  circle A4 centre (32.5, 91.8) radius 2
  circle A5 centre (32.5, 11.2) radius 2
  line L3 (40.5, 11.2) -> (32.5, 11.2)
  line L4 (40.5, 11.2) -> (48.5, 11.2)
  circle A6 centre (48.5, 11.2) radius 2
  line L5 (48.5, 11.2) -> (56.5, 11.2)
  line L6 (32.5, 11.2) -> (24.5, 11.2)
  circle A7 centre (24.5, 11.2) radius 2
  circle A8 centre (56.5, 11.2) radius 2
  line L7 (56.5, 11.2) -> (64.5, 11.2)
  line L8 (64.5, 11.2) -> (64.5, 21.2)
  line L9 (64.5, 21.2) -> (16.5, 21.2)
  circle A9 centre (64.5, 21.2) radius 2
  circle A10 centre (16.5, 21.2) radius 2
  line L10 (0, 0) -> (81, 0) projected
  line L11 (40.5, 0) -> (40.5, 11.2)
  point P0 (44, 0)
  dimension "d116" = 20
  dimension "d117" = 8
  dimension "d118" = 8
  dimension "d119" = 4
  dimension "d120" = 4
  dimension "d121" = 8
  dimension "d122" = 8
  dimension "d123" = 4
  dimension "d124" = 4
  dimension "d125" = 8
  dimension "d126" = 10
  dimension "d127" = 48
  dimension "d128" = 4
  dimension "d129" = 4
extrude "Extrusion15" cut sketch "Sketch18" against normal up to surface (3 mm away) contours A0 | A1 | A4 | A3 | A10 | A9 L9 L8 | L8 L9 A9
sketch "Sketch19" plane through (-34, 0, -39.8) normal (0, 0, 1) x (1, 0, 0)
  line L0 (70, 97) -> (70, 70) projected
  circle A0 centre (70, 97) radius 61.75
  circle A1 centre (17.2, 55.8) radius 1.5875 projected
  line L1 (17.2, 55.8) -> (30.55, 55.8)
  line L2 (30.55, 55.8) -> (30.55, 49.4946)
  circle A2 centre (30.55, 49.4946) radius 1.55
  point P0 (34, 0)
  dimension "d132" = 123.5
  dimension "d133" = 13.35
  dimension "d134" = 3.1
extrude "Extrusion16" cut sketch "Sketch19" against normal blind 13.375 contours A2 A0 | A0 L2 A2 | A2 L2 A0
equation "\"BendRadius\" = Thickness"
equation "\"BendReliefWidth\" = Thickness"
equation "\"BendReliefDepth\" = 0.5 * Thickness"
equation "\"CornerReliefSize\" = 4 * Thickness"
equation "\"MinimumRemnant\" = 2 * Thickness"
equation "\"TransitionRadius\" = BendRadius"
equation "\"JacobiRadiusSize\" = Thickness"
equation "\"GapSize\" = Thickness"
equation "\"Thickness\" = 3"
properties part number "obudowa" material "ABS Plastic"
